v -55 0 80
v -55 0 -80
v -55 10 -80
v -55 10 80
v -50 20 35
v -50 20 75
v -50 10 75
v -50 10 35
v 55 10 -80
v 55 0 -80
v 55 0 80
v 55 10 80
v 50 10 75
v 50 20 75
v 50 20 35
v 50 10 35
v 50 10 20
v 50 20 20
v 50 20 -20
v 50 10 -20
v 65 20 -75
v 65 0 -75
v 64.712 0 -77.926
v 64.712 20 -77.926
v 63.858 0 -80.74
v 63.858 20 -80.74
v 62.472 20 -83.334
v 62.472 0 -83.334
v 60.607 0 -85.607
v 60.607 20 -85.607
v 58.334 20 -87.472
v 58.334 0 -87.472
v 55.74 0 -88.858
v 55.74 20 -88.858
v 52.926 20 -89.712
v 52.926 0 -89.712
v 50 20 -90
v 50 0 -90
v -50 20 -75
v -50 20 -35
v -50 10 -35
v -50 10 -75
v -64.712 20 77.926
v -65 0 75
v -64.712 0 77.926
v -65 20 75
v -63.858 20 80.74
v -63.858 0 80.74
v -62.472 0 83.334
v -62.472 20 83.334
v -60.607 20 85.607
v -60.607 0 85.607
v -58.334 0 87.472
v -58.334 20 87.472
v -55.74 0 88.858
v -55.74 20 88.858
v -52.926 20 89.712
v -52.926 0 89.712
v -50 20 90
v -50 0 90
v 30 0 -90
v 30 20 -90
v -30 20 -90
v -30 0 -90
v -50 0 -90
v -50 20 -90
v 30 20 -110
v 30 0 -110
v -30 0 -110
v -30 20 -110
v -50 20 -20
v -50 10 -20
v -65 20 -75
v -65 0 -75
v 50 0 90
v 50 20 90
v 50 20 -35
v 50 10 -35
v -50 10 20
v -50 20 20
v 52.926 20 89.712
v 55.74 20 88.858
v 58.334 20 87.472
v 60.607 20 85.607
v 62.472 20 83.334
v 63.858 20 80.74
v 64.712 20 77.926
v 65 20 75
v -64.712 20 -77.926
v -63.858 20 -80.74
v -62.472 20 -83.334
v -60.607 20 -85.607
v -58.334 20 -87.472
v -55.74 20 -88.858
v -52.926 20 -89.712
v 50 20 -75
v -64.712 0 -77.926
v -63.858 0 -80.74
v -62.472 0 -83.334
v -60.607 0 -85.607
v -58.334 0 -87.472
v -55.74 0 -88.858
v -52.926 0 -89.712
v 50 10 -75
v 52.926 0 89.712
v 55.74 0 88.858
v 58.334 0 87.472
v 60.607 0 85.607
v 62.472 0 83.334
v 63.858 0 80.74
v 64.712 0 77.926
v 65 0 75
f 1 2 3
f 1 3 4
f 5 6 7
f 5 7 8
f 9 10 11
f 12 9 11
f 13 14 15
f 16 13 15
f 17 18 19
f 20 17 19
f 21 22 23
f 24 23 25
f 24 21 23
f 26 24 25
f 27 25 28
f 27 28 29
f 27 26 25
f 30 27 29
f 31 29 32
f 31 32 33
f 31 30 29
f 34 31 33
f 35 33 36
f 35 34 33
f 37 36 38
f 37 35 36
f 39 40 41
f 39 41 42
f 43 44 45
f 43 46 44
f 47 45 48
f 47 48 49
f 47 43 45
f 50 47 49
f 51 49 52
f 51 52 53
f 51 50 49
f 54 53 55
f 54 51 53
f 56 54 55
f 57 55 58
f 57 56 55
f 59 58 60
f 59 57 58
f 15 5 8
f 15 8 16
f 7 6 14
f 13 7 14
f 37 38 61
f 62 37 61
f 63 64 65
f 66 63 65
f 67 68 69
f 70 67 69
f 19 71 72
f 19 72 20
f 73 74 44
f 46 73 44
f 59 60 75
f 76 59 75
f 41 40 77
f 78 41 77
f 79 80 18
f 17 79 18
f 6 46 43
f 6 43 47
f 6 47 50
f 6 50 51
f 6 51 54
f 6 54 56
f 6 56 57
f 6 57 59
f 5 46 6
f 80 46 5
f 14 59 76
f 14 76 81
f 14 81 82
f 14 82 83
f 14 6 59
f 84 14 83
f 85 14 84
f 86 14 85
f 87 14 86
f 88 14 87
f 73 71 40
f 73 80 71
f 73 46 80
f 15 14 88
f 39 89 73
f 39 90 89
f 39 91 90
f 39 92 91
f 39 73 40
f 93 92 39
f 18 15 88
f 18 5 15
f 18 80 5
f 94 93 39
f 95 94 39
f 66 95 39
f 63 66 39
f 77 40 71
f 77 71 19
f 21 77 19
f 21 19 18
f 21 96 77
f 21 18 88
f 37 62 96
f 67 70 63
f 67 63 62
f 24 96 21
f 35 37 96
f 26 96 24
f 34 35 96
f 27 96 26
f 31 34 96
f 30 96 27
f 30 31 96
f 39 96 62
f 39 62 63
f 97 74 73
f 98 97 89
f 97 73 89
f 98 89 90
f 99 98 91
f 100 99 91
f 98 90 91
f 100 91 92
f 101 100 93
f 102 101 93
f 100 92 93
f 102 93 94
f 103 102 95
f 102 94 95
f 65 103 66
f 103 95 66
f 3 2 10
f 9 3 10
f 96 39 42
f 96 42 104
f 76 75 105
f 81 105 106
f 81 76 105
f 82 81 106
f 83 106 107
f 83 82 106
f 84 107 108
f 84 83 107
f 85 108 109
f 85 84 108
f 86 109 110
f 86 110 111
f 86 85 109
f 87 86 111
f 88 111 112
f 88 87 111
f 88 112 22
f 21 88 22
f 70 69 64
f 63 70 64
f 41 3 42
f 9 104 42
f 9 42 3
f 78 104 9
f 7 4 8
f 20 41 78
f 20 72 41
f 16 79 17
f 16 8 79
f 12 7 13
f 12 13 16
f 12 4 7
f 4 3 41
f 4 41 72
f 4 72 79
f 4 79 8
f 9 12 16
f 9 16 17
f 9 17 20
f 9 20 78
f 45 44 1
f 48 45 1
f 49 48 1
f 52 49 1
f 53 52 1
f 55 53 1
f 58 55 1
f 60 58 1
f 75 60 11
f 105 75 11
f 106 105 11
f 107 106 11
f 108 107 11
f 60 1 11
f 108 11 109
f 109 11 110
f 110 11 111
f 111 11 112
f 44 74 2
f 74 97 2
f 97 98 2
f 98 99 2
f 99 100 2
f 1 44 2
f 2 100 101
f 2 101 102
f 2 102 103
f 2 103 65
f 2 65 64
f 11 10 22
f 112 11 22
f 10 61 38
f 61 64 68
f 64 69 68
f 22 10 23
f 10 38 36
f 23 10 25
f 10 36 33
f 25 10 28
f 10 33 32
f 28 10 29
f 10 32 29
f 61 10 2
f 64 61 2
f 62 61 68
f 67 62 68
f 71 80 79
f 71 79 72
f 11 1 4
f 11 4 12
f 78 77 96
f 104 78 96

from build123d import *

# Parameters (mm, degrees)
EXTRUDE_1_DEPTH     = 20
SKETCH_2_W          = 100
SKETCH_2_H          = 40
CUT_EXTRUDE_1_DEPTH = 20
FILLET_1_R          = 15
SKETCH_3_W          = 110
SKETCH_3_H          = 160
CUT_EXTRUDE_2_DEPTH = 10


with BuildPart() as part:
    # 스케치1 → 보스-돌출1 (new body)
    with BuildSketch(Plane(origin=(0, 0, 0), x_dir=(1, 0, 0), z_dir=(0, 1, 0))):
        Polygon((-65, 90), (-65, -90), (65, -90), (65, 90), (30, 90), (30, 110), (-30, 110), (-30, 90), align=None)
    extrude(amount=EXTRUDE_1_DEPTH)

    # 스케치2 → 컷-돌출1 (cut)
    with BuildSketch(Plane(origin=(0, 20, 0), x_dir=(1, 0, 0), z_dir=(0, 1, 0))):
        with Locations((0, -55)):
            Rectangle(SKETCH_2_W, SKETCH_2_H)
        with Locations((0, 55)):
            Rectangle(SKETCH_2_W, SKETCH_2_H)
        Rectangle(SKETCH_2_W, SKETCH_2_H)
    extrude(amount=-CUT_EXTRUDE_1_DEPTH, mode=Mode.SUBTRACT)

    # 필렛1
    fillet_1_edges = [part.edges().sort_by_distance(p)[0] for p in [
        (65, 10, -90),
        (65, 10, 90),
        (-65, 10, 90),
        (-65, 10, -90),
    ]]
    fillet(fillet_1_edges, radius=FILLET_1_R)

    # 스케치3 → 컷-돌출2 (cut)
    with BuildSketch(Plane.XZ):
        Rectangle(SKETCH_3_W, SKETCH_3_H)
    extrude(amount=-CUT_EXTRUDE_2_DEPTH, mode=Mode.SUBTRACT)


solid = part.part
